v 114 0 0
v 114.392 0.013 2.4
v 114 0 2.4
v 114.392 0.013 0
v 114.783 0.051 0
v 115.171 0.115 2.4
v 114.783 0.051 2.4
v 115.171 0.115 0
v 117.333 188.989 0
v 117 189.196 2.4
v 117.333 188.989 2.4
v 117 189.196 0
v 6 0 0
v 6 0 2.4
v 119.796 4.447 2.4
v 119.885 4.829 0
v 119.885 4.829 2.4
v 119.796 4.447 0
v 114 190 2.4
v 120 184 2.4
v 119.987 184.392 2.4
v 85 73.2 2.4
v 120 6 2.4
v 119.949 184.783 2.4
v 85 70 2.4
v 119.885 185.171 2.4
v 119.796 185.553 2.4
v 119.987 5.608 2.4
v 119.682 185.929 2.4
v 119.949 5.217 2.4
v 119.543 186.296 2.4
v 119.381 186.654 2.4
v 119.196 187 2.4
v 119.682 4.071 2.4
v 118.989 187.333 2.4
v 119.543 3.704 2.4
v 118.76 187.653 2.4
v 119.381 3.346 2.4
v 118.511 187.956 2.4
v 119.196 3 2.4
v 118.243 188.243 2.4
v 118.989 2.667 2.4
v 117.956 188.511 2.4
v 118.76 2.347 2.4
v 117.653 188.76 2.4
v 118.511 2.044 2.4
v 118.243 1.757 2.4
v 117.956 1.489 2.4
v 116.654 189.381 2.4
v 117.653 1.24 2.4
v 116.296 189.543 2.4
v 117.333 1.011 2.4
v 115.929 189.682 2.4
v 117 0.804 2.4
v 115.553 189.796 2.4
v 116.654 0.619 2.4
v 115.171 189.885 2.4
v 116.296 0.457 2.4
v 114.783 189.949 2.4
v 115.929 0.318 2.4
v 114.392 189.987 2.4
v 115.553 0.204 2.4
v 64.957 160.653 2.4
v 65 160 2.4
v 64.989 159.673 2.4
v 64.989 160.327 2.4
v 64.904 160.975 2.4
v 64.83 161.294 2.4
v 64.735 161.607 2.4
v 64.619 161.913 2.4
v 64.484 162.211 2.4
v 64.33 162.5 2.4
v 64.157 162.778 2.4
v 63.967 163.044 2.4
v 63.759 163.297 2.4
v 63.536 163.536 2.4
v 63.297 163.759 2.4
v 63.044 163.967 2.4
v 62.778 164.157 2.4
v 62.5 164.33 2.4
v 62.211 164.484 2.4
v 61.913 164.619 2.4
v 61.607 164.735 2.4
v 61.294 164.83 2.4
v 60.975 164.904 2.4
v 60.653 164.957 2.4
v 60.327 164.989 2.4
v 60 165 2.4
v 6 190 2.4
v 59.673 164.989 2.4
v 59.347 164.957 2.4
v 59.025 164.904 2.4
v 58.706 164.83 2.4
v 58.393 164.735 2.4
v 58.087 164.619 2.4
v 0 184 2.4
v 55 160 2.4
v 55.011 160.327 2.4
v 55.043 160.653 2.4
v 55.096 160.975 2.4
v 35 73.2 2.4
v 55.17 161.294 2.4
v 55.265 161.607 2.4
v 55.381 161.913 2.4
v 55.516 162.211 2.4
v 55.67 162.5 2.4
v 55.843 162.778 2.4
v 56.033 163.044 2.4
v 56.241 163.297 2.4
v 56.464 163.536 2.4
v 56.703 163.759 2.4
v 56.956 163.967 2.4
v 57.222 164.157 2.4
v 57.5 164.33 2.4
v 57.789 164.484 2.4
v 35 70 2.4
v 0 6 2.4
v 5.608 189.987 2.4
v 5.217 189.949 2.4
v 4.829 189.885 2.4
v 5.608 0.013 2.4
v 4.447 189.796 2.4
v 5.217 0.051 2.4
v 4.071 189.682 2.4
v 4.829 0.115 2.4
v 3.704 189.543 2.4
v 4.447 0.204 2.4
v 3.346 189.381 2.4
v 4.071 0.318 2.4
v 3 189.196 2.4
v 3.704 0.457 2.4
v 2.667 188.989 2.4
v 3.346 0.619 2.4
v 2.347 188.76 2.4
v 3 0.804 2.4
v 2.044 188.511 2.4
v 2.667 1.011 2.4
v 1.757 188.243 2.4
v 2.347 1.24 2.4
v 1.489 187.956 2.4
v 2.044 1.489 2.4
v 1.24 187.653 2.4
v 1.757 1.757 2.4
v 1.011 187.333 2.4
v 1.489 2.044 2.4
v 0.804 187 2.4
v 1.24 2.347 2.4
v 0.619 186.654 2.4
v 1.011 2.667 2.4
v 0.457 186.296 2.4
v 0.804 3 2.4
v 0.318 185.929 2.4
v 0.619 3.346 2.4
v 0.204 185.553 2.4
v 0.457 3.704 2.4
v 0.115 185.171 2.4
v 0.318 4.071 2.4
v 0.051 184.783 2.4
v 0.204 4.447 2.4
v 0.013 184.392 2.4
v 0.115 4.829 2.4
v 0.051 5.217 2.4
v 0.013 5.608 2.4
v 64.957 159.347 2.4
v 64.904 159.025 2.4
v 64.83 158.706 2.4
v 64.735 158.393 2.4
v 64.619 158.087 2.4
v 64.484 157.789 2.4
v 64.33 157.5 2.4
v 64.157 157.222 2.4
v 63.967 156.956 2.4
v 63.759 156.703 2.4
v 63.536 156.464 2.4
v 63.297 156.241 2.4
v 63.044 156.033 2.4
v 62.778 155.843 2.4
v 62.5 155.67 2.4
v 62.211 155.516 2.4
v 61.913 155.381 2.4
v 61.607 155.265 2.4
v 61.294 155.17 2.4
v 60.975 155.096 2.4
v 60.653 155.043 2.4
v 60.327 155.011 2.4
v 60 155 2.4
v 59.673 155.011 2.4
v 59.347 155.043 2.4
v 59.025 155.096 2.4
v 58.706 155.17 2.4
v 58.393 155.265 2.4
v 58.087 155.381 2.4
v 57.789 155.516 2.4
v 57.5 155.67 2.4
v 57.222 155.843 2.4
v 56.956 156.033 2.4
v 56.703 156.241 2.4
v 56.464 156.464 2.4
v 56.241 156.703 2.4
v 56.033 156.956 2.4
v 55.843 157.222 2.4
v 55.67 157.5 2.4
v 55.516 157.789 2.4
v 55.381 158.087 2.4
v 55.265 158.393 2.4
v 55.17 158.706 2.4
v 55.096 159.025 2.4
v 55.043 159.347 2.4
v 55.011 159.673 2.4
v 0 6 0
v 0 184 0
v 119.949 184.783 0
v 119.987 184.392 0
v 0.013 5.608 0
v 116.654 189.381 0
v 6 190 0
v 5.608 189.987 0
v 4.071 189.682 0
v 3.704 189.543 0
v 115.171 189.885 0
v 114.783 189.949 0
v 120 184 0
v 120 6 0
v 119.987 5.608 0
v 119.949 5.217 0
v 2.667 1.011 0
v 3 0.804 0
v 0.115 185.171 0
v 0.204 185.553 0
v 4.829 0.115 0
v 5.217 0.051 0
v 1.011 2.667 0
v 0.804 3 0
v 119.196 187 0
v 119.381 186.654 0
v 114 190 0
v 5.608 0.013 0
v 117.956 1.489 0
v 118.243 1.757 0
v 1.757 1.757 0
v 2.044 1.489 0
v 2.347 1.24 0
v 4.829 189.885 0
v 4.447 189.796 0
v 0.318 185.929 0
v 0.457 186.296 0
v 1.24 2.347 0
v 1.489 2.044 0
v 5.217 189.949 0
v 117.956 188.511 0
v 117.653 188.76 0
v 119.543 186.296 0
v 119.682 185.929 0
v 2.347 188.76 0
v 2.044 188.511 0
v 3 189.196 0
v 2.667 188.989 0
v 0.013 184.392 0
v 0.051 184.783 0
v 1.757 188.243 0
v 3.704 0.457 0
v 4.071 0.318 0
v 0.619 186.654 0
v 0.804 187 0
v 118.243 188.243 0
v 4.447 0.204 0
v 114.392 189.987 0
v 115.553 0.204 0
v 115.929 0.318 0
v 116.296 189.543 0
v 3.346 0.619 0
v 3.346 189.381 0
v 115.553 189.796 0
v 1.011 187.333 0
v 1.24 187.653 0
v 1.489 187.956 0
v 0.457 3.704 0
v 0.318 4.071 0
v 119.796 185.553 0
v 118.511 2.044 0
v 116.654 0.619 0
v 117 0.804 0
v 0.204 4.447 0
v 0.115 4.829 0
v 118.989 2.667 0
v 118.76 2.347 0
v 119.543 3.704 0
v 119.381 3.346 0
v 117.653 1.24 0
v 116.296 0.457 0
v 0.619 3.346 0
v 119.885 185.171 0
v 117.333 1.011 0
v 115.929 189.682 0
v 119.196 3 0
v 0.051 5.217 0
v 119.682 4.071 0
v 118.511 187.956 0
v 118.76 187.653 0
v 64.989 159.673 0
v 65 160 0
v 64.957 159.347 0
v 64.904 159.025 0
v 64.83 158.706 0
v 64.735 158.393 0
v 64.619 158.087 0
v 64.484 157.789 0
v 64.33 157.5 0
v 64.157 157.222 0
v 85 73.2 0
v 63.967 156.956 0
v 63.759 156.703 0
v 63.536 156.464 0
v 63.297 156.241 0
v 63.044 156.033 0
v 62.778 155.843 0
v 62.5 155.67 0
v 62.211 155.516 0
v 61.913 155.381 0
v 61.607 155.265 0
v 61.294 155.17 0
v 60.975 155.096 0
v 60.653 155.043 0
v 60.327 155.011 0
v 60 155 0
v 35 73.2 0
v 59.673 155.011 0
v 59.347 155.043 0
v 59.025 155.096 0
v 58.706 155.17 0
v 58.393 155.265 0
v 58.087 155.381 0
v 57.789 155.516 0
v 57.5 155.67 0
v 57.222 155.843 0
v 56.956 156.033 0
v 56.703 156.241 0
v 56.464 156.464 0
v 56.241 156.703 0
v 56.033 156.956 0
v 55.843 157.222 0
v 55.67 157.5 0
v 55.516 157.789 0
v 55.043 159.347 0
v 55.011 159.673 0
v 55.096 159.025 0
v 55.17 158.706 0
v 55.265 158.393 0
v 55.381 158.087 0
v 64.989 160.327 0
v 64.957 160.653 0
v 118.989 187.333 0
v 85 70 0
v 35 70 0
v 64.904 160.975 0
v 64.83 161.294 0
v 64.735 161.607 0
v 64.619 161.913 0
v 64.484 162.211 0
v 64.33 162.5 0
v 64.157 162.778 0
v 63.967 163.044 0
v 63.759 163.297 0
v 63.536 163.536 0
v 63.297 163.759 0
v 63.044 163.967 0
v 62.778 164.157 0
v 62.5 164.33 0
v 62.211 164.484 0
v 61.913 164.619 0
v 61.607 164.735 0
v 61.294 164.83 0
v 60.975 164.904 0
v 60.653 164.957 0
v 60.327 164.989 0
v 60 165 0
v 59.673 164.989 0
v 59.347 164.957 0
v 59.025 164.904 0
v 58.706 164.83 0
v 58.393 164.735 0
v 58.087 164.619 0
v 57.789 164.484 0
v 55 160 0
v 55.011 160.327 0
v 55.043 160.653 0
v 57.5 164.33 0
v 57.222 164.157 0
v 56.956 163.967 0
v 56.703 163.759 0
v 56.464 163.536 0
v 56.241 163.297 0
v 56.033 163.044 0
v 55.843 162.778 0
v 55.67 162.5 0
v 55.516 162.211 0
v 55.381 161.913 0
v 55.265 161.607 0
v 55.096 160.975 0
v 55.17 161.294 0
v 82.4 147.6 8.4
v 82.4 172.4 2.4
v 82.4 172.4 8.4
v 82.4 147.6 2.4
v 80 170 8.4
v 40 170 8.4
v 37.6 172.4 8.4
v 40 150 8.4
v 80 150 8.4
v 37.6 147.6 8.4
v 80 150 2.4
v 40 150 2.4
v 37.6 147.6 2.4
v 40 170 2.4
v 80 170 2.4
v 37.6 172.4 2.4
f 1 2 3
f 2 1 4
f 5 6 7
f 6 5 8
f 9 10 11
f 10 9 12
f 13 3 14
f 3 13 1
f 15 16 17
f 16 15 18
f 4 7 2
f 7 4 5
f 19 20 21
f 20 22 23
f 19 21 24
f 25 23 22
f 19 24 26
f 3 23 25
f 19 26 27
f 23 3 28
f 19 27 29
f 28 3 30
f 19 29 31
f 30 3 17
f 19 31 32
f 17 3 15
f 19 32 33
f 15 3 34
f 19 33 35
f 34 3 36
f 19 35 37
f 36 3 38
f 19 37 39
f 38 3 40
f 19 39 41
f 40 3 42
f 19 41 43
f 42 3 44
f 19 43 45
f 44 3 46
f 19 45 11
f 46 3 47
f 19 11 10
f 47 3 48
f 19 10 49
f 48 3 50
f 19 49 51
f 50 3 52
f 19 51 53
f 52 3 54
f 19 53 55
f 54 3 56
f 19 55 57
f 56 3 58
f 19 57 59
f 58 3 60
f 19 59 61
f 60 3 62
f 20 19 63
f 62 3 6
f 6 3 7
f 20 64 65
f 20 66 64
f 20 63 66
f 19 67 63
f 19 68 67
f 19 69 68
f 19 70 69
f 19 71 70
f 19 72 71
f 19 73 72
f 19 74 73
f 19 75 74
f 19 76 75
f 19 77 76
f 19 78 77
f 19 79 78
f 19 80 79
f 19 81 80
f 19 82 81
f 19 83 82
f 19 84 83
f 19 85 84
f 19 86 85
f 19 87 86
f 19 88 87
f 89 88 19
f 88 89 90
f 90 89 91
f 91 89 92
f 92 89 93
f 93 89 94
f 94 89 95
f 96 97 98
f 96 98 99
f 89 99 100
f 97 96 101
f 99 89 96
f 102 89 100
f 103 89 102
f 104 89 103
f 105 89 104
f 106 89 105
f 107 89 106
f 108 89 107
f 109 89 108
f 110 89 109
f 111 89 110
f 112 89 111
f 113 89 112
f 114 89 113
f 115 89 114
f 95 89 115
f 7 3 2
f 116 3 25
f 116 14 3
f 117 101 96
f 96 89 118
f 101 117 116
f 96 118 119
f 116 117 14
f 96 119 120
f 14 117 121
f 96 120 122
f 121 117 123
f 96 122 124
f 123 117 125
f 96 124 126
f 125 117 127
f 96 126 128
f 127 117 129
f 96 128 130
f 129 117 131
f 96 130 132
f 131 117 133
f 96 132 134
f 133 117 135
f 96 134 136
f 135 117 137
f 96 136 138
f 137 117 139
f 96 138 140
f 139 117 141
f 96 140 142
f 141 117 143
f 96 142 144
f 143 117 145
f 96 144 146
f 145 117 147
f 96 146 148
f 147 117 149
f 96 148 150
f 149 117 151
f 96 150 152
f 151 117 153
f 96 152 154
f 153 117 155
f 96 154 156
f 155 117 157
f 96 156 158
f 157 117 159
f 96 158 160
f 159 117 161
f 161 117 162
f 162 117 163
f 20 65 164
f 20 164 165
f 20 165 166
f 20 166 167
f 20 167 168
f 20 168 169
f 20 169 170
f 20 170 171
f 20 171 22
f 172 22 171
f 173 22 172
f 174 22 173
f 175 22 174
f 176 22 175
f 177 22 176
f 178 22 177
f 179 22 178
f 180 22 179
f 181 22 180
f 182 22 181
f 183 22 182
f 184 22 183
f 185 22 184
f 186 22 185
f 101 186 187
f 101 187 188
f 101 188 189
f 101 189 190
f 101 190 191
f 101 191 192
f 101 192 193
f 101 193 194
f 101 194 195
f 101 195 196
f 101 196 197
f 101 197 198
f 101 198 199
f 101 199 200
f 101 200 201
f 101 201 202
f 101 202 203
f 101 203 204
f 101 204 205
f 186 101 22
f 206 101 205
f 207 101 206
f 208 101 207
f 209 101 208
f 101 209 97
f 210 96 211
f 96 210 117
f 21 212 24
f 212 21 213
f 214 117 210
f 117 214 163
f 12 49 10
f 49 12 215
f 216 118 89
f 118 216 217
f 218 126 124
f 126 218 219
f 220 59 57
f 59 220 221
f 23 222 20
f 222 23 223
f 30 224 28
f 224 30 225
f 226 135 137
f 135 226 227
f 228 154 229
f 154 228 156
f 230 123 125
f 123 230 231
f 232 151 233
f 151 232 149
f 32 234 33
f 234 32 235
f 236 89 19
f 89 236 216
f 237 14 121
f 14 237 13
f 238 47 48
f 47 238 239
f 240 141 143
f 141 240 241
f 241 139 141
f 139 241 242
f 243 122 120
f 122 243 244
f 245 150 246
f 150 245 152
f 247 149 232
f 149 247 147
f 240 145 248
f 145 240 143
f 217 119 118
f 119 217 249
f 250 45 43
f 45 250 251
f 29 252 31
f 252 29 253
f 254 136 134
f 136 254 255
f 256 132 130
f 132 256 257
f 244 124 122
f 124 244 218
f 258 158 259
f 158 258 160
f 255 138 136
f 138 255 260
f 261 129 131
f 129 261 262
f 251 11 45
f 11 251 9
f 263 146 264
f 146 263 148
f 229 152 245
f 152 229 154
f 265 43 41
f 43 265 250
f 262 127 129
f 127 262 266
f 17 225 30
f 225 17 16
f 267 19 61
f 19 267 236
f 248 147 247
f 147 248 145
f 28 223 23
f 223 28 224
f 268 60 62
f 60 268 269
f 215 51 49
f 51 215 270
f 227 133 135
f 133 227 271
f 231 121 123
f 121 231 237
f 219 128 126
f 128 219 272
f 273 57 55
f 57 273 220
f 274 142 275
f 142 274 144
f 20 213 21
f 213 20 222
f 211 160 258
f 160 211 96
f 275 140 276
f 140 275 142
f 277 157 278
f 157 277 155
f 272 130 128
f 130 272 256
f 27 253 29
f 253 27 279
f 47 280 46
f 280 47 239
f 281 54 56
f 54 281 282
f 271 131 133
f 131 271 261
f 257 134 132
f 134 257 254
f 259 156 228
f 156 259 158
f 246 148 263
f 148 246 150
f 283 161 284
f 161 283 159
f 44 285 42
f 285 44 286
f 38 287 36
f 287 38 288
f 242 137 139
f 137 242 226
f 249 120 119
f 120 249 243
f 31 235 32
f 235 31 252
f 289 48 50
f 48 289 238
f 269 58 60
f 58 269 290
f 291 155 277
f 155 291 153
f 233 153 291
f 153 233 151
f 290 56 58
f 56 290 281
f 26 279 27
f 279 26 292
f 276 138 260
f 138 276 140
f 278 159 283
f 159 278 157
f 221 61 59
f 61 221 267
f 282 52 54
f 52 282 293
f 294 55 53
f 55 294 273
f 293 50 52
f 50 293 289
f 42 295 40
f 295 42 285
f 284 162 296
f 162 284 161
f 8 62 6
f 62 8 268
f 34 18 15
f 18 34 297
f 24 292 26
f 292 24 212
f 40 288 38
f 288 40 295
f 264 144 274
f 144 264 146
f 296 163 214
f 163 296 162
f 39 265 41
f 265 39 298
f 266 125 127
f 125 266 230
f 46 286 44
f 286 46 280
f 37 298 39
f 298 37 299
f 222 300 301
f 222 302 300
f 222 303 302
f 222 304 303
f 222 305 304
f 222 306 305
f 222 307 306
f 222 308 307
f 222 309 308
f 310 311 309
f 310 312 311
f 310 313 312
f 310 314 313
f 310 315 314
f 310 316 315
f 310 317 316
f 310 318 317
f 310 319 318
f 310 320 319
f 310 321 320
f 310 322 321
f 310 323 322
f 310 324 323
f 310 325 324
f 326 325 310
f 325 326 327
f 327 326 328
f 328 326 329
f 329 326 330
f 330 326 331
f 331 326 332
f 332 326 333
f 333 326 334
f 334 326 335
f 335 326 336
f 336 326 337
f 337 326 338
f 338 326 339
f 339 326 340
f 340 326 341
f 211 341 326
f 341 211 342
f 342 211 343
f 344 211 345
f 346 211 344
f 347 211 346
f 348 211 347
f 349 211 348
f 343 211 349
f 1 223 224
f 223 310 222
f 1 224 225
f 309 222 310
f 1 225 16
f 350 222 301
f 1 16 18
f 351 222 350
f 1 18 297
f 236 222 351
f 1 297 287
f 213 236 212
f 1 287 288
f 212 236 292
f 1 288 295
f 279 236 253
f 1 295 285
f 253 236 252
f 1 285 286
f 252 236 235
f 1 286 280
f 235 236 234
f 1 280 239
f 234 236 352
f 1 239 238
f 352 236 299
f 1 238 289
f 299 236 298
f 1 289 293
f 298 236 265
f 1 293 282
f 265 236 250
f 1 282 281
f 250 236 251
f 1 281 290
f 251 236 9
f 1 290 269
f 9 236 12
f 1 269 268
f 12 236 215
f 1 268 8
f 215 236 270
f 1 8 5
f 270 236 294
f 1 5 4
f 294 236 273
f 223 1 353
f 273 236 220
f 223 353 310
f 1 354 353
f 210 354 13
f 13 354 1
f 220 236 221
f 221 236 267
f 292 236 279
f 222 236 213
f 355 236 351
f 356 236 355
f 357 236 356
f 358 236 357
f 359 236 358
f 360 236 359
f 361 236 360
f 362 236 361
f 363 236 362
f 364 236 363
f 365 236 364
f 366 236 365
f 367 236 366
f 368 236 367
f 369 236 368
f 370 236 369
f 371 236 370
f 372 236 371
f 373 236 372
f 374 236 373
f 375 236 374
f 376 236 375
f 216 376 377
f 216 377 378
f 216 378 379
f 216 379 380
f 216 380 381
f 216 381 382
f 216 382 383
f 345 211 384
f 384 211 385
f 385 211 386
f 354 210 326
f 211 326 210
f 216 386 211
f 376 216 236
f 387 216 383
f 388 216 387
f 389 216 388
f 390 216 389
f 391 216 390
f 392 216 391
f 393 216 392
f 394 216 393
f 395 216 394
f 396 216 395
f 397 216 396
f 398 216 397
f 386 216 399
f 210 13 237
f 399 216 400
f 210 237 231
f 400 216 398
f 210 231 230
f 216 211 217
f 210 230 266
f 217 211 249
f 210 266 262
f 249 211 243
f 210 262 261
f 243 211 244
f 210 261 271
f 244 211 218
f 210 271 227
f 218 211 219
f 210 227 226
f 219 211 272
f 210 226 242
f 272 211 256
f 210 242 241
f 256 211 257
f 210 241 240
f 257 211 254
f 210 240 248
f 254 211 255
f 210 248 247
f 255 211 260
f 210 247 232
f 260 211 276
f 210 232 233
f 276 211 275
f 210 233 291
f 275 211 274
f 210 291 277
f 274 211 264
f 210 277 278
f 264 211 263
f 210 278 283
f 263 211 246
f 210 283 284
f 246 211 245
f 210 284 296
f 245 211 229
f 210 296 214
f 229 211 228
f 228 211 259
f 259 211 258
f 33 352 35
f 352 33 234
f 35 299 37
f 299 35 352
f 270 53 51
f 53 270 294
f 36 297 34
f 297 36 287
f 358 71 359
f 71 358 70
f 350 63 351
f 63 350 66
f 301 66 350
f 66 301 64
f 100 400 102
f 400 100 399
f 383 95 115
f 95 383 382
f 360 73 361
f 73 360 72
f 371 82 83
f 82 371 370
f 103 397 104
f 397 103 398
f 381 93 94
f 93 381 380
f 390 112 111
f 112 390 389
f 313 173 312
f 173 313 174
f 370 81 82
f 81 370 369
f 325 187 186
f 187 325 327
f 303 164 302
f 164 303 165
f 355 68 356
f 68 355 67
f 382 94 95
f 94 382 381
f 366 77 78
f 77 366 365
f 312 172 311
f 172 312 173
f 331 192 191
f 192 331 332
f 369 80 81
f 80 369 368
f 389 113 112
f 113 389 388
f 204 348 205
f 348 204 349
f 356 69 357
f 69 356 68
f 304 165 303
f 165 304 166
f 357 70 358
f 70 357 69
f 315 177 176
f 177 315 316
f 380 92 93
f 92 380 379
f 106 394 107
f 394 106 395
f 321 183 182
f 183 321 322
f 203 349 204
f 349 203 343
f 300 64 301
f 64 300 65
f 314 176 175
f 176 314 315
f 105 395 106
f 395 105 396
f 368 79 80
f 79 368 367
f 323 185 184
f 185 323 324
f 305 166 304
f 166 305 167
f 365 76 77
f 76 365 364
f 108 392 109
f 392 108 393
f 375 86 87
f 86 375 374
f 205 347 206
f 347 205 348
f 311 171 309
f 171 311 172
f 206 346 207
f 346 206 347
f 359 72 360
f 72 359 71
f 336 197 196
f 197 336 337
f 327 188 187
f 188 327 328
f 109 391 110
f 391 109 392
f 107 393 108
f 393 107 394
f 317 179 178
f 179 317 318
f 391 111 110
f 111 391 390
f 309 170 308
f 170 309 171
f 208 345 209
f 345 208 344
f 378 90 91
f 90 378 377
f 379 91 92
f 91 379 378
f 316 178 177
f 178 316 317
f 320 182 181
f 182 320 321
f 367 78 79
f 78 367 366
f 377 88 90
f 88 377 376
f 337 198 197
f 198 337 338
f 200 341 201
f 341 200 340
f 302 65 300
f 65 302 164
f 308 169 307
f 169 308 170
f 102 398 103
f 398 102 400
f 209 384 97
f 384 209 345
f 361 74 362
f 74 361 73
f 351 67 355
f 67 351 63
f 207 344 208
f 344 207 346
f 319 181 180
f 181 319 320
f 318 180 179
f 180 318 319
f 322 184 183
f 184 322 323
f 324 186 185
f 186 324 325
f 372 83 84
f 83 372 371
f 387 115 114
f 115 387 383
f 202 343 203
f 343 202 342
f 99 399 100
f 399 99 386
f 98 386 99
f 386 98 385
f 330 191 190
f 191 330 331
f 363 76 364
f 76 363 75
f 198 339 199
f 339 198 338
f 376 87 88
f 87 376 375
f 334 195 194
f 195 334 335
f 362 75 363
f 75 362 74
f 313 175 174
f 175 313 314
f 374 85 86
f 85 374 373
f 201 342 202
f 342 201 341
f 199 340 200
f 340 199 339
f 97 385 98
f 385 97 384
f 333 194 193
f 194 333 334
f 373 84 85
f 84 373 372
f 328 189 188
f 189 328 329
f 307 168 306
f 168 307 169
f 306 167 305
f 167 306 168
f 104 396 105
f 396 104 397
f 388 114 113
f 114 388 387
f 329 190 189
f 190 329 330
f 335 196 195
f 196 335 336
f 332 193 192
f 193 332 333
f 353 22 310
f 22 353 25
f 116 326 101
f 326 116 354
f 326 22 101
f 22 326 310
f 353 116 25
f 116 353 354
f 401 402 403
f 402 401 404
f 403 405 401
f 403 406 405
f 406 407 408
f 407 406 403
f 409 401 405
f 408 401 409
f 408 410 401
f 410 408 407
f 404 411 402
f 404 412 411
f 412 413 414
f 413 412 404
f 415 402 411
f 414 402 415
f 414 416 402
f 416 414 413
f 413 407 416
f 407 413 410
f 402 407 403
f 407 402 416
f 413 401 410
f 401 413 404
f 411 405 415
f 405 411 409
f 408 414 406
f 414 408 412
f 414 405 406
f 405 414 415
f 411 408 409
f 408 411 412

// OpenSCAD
// Triage Pod case: three prints that each fit a 3.5-hour slot at the Cal Hacks 3D printing station.
// Measure your parts and change the numbers in this block, then render one part at a time:
//   part = "faceplate";  part = "watch_shelf";  part = "base";
// Export STL (F6 then File > Export). 0.28 mm layers, 15% infill, no supports needed.

part = "faceplate"; // faceplate | watch_shelf | base
lettering = false;  // true engraves "Finger here / TRIAGE POD" on the faceplate

// ---- measure these (mm) ----
camera_board_w   = 40;   // Grove Vision AI V2 board width  (measure yours)
camera_board_h   = 20;   // Grove Vision AI V2 board height (measure yours)
lens_d           = 10;   // hole for the camera lens
watch_d          = 42;   // round display outer diameter (measure yours; ~40–44)
watch_thick      = 16;   // watch body thickness incl. battery, screen to sensor window
sensor_x         = 0;    // sensor window offset from the watch centre, mm (measure on the back)
sensor_y         = 8;
battery_w        = 36;   // 1200 mAh LiPo
battery_h        = 64;
battery_t        = 6;

// ---- case sizes ----
face_w           = 120;  // front panel width
face_h           = 190;  // front panel height; camera window near the top = patient's eye level
wall             = 2.4;
shelf_tilt       = 25;   // degrees, screen tilted up toward the patient
depth            = 70;   // base tray depth

$fn = 96;

module faceplate() {
  difference() {
    // panel with rounded corners
    linear_extrude(wall) offset(r = 6) offset(delta = -6) square([face_w, face_h]);
    // camera window: lens hole plus a shallow pocket for the camera board behind it
    translate([face_w / 2, face_h - 30, -1]) cylinder(d = lens_d, h = wall + 2);
    // slot the watch shelf hooks into
    translate([face_w / 2 - 25, 70, -1]) cube([50, 3.2, wall + 2]);
    // optional lettering, 0.6 mm deep, below the shelf
    if (lettering) translate([face_w / 2, 52, wall - 0.6]) linear_extrude(1) text("Ponga su dedo aqui", size = 6, halign = "center", font = "Liberation Sans:style=Bold");
    if (lettering) translate([face_w / 2, 42, wall - 0.6]) linear_extrude(1) text("Finger here", size = 5, halign = "center");
    if (lettering) translate([face_w / 2, 12, wall - 0.6]) linear_extrude(1) text("TRIAGE POD", size = 7, halign = "center", font = "Liberation Sans:style=Bold");
  }
  // camera board pocket rails on the back
  translate([face_w / 2 - camera_board_w / 2 - wall, face_h - 30 - camera_board_h / 2 - wall, wall])
    difference() {
      cube([camera_board_w + 2 * wall, camera_board_h + 2 * wall, 6]);
      translate([wall, wall, -1]) cube([camera_board_w, camera_board_h, 8]);
    }
}

// Tilted cradle: the watch lies screen-up; a slot underneath lets a fingertip reach the sensor.
module watch_shelf() {
  r = watch_d / 2 + wall;
  rotate([shelf_tilt, 0, 0]) difference() {
    union() {
      cylinder(r = r, h = watch_thick + wall);
      // hook tab that goes through the faceplate slot
      translate([-25, -r - 3, 0]) cube([50, 3, watch_thick + wall]);
    }
    // watch pocket
    translate([0, 0, wall]) cylinder(d = watch_d + 0.6, h = watch_thick + 2);
    // finger slot from the front, under the sensor window
    translate([sensor_x - 11, -r - 5, -1]) cube([22, r + sensor_y + 5, wall + 2]);
    // cable notch for the watch's USB-C
    translate([r - 8, -6, wall]) cube([12, 12, watch_thick + 2]);
  }
}

// Open-back tray: battery and charger lie flat; the faceplate clips to the front lip.
module base() {
  difference() {
    cube([face_w, depth, 40]);
    translate([wall, wall, wall]) cube([face_w - 2 * wall, depth - wall, 40]);
    // front lip groove for the faceplate
    translate([-1, wall, 30]) cube([face_w + 2, wall + 0.4, 12]);
    // switch and charger USB-C holes on the left side
    translate([-1, depth / 2, 12]) rotate([0, 90, 0]) cylinder(d = 8, h = wall + 2);
    translate([-1, depth / 2 + 14, 10]) cube([wall + 2, 10, 5]);
  }
  // battery rails
  translate([face_w / 2 - battery_w / 2 - wall, wall, wall]) cube([wall, battery_h, battery_t + 3]);
  translate([face_w / 2 + battery_w / 2, wall, wall]) cube([wall, battery_h, battery_t + 3]);
}

if (part == "faceplate") faceplate();
if (part == "watch_shelf") watch_shelf();
if (part == "base") base();
